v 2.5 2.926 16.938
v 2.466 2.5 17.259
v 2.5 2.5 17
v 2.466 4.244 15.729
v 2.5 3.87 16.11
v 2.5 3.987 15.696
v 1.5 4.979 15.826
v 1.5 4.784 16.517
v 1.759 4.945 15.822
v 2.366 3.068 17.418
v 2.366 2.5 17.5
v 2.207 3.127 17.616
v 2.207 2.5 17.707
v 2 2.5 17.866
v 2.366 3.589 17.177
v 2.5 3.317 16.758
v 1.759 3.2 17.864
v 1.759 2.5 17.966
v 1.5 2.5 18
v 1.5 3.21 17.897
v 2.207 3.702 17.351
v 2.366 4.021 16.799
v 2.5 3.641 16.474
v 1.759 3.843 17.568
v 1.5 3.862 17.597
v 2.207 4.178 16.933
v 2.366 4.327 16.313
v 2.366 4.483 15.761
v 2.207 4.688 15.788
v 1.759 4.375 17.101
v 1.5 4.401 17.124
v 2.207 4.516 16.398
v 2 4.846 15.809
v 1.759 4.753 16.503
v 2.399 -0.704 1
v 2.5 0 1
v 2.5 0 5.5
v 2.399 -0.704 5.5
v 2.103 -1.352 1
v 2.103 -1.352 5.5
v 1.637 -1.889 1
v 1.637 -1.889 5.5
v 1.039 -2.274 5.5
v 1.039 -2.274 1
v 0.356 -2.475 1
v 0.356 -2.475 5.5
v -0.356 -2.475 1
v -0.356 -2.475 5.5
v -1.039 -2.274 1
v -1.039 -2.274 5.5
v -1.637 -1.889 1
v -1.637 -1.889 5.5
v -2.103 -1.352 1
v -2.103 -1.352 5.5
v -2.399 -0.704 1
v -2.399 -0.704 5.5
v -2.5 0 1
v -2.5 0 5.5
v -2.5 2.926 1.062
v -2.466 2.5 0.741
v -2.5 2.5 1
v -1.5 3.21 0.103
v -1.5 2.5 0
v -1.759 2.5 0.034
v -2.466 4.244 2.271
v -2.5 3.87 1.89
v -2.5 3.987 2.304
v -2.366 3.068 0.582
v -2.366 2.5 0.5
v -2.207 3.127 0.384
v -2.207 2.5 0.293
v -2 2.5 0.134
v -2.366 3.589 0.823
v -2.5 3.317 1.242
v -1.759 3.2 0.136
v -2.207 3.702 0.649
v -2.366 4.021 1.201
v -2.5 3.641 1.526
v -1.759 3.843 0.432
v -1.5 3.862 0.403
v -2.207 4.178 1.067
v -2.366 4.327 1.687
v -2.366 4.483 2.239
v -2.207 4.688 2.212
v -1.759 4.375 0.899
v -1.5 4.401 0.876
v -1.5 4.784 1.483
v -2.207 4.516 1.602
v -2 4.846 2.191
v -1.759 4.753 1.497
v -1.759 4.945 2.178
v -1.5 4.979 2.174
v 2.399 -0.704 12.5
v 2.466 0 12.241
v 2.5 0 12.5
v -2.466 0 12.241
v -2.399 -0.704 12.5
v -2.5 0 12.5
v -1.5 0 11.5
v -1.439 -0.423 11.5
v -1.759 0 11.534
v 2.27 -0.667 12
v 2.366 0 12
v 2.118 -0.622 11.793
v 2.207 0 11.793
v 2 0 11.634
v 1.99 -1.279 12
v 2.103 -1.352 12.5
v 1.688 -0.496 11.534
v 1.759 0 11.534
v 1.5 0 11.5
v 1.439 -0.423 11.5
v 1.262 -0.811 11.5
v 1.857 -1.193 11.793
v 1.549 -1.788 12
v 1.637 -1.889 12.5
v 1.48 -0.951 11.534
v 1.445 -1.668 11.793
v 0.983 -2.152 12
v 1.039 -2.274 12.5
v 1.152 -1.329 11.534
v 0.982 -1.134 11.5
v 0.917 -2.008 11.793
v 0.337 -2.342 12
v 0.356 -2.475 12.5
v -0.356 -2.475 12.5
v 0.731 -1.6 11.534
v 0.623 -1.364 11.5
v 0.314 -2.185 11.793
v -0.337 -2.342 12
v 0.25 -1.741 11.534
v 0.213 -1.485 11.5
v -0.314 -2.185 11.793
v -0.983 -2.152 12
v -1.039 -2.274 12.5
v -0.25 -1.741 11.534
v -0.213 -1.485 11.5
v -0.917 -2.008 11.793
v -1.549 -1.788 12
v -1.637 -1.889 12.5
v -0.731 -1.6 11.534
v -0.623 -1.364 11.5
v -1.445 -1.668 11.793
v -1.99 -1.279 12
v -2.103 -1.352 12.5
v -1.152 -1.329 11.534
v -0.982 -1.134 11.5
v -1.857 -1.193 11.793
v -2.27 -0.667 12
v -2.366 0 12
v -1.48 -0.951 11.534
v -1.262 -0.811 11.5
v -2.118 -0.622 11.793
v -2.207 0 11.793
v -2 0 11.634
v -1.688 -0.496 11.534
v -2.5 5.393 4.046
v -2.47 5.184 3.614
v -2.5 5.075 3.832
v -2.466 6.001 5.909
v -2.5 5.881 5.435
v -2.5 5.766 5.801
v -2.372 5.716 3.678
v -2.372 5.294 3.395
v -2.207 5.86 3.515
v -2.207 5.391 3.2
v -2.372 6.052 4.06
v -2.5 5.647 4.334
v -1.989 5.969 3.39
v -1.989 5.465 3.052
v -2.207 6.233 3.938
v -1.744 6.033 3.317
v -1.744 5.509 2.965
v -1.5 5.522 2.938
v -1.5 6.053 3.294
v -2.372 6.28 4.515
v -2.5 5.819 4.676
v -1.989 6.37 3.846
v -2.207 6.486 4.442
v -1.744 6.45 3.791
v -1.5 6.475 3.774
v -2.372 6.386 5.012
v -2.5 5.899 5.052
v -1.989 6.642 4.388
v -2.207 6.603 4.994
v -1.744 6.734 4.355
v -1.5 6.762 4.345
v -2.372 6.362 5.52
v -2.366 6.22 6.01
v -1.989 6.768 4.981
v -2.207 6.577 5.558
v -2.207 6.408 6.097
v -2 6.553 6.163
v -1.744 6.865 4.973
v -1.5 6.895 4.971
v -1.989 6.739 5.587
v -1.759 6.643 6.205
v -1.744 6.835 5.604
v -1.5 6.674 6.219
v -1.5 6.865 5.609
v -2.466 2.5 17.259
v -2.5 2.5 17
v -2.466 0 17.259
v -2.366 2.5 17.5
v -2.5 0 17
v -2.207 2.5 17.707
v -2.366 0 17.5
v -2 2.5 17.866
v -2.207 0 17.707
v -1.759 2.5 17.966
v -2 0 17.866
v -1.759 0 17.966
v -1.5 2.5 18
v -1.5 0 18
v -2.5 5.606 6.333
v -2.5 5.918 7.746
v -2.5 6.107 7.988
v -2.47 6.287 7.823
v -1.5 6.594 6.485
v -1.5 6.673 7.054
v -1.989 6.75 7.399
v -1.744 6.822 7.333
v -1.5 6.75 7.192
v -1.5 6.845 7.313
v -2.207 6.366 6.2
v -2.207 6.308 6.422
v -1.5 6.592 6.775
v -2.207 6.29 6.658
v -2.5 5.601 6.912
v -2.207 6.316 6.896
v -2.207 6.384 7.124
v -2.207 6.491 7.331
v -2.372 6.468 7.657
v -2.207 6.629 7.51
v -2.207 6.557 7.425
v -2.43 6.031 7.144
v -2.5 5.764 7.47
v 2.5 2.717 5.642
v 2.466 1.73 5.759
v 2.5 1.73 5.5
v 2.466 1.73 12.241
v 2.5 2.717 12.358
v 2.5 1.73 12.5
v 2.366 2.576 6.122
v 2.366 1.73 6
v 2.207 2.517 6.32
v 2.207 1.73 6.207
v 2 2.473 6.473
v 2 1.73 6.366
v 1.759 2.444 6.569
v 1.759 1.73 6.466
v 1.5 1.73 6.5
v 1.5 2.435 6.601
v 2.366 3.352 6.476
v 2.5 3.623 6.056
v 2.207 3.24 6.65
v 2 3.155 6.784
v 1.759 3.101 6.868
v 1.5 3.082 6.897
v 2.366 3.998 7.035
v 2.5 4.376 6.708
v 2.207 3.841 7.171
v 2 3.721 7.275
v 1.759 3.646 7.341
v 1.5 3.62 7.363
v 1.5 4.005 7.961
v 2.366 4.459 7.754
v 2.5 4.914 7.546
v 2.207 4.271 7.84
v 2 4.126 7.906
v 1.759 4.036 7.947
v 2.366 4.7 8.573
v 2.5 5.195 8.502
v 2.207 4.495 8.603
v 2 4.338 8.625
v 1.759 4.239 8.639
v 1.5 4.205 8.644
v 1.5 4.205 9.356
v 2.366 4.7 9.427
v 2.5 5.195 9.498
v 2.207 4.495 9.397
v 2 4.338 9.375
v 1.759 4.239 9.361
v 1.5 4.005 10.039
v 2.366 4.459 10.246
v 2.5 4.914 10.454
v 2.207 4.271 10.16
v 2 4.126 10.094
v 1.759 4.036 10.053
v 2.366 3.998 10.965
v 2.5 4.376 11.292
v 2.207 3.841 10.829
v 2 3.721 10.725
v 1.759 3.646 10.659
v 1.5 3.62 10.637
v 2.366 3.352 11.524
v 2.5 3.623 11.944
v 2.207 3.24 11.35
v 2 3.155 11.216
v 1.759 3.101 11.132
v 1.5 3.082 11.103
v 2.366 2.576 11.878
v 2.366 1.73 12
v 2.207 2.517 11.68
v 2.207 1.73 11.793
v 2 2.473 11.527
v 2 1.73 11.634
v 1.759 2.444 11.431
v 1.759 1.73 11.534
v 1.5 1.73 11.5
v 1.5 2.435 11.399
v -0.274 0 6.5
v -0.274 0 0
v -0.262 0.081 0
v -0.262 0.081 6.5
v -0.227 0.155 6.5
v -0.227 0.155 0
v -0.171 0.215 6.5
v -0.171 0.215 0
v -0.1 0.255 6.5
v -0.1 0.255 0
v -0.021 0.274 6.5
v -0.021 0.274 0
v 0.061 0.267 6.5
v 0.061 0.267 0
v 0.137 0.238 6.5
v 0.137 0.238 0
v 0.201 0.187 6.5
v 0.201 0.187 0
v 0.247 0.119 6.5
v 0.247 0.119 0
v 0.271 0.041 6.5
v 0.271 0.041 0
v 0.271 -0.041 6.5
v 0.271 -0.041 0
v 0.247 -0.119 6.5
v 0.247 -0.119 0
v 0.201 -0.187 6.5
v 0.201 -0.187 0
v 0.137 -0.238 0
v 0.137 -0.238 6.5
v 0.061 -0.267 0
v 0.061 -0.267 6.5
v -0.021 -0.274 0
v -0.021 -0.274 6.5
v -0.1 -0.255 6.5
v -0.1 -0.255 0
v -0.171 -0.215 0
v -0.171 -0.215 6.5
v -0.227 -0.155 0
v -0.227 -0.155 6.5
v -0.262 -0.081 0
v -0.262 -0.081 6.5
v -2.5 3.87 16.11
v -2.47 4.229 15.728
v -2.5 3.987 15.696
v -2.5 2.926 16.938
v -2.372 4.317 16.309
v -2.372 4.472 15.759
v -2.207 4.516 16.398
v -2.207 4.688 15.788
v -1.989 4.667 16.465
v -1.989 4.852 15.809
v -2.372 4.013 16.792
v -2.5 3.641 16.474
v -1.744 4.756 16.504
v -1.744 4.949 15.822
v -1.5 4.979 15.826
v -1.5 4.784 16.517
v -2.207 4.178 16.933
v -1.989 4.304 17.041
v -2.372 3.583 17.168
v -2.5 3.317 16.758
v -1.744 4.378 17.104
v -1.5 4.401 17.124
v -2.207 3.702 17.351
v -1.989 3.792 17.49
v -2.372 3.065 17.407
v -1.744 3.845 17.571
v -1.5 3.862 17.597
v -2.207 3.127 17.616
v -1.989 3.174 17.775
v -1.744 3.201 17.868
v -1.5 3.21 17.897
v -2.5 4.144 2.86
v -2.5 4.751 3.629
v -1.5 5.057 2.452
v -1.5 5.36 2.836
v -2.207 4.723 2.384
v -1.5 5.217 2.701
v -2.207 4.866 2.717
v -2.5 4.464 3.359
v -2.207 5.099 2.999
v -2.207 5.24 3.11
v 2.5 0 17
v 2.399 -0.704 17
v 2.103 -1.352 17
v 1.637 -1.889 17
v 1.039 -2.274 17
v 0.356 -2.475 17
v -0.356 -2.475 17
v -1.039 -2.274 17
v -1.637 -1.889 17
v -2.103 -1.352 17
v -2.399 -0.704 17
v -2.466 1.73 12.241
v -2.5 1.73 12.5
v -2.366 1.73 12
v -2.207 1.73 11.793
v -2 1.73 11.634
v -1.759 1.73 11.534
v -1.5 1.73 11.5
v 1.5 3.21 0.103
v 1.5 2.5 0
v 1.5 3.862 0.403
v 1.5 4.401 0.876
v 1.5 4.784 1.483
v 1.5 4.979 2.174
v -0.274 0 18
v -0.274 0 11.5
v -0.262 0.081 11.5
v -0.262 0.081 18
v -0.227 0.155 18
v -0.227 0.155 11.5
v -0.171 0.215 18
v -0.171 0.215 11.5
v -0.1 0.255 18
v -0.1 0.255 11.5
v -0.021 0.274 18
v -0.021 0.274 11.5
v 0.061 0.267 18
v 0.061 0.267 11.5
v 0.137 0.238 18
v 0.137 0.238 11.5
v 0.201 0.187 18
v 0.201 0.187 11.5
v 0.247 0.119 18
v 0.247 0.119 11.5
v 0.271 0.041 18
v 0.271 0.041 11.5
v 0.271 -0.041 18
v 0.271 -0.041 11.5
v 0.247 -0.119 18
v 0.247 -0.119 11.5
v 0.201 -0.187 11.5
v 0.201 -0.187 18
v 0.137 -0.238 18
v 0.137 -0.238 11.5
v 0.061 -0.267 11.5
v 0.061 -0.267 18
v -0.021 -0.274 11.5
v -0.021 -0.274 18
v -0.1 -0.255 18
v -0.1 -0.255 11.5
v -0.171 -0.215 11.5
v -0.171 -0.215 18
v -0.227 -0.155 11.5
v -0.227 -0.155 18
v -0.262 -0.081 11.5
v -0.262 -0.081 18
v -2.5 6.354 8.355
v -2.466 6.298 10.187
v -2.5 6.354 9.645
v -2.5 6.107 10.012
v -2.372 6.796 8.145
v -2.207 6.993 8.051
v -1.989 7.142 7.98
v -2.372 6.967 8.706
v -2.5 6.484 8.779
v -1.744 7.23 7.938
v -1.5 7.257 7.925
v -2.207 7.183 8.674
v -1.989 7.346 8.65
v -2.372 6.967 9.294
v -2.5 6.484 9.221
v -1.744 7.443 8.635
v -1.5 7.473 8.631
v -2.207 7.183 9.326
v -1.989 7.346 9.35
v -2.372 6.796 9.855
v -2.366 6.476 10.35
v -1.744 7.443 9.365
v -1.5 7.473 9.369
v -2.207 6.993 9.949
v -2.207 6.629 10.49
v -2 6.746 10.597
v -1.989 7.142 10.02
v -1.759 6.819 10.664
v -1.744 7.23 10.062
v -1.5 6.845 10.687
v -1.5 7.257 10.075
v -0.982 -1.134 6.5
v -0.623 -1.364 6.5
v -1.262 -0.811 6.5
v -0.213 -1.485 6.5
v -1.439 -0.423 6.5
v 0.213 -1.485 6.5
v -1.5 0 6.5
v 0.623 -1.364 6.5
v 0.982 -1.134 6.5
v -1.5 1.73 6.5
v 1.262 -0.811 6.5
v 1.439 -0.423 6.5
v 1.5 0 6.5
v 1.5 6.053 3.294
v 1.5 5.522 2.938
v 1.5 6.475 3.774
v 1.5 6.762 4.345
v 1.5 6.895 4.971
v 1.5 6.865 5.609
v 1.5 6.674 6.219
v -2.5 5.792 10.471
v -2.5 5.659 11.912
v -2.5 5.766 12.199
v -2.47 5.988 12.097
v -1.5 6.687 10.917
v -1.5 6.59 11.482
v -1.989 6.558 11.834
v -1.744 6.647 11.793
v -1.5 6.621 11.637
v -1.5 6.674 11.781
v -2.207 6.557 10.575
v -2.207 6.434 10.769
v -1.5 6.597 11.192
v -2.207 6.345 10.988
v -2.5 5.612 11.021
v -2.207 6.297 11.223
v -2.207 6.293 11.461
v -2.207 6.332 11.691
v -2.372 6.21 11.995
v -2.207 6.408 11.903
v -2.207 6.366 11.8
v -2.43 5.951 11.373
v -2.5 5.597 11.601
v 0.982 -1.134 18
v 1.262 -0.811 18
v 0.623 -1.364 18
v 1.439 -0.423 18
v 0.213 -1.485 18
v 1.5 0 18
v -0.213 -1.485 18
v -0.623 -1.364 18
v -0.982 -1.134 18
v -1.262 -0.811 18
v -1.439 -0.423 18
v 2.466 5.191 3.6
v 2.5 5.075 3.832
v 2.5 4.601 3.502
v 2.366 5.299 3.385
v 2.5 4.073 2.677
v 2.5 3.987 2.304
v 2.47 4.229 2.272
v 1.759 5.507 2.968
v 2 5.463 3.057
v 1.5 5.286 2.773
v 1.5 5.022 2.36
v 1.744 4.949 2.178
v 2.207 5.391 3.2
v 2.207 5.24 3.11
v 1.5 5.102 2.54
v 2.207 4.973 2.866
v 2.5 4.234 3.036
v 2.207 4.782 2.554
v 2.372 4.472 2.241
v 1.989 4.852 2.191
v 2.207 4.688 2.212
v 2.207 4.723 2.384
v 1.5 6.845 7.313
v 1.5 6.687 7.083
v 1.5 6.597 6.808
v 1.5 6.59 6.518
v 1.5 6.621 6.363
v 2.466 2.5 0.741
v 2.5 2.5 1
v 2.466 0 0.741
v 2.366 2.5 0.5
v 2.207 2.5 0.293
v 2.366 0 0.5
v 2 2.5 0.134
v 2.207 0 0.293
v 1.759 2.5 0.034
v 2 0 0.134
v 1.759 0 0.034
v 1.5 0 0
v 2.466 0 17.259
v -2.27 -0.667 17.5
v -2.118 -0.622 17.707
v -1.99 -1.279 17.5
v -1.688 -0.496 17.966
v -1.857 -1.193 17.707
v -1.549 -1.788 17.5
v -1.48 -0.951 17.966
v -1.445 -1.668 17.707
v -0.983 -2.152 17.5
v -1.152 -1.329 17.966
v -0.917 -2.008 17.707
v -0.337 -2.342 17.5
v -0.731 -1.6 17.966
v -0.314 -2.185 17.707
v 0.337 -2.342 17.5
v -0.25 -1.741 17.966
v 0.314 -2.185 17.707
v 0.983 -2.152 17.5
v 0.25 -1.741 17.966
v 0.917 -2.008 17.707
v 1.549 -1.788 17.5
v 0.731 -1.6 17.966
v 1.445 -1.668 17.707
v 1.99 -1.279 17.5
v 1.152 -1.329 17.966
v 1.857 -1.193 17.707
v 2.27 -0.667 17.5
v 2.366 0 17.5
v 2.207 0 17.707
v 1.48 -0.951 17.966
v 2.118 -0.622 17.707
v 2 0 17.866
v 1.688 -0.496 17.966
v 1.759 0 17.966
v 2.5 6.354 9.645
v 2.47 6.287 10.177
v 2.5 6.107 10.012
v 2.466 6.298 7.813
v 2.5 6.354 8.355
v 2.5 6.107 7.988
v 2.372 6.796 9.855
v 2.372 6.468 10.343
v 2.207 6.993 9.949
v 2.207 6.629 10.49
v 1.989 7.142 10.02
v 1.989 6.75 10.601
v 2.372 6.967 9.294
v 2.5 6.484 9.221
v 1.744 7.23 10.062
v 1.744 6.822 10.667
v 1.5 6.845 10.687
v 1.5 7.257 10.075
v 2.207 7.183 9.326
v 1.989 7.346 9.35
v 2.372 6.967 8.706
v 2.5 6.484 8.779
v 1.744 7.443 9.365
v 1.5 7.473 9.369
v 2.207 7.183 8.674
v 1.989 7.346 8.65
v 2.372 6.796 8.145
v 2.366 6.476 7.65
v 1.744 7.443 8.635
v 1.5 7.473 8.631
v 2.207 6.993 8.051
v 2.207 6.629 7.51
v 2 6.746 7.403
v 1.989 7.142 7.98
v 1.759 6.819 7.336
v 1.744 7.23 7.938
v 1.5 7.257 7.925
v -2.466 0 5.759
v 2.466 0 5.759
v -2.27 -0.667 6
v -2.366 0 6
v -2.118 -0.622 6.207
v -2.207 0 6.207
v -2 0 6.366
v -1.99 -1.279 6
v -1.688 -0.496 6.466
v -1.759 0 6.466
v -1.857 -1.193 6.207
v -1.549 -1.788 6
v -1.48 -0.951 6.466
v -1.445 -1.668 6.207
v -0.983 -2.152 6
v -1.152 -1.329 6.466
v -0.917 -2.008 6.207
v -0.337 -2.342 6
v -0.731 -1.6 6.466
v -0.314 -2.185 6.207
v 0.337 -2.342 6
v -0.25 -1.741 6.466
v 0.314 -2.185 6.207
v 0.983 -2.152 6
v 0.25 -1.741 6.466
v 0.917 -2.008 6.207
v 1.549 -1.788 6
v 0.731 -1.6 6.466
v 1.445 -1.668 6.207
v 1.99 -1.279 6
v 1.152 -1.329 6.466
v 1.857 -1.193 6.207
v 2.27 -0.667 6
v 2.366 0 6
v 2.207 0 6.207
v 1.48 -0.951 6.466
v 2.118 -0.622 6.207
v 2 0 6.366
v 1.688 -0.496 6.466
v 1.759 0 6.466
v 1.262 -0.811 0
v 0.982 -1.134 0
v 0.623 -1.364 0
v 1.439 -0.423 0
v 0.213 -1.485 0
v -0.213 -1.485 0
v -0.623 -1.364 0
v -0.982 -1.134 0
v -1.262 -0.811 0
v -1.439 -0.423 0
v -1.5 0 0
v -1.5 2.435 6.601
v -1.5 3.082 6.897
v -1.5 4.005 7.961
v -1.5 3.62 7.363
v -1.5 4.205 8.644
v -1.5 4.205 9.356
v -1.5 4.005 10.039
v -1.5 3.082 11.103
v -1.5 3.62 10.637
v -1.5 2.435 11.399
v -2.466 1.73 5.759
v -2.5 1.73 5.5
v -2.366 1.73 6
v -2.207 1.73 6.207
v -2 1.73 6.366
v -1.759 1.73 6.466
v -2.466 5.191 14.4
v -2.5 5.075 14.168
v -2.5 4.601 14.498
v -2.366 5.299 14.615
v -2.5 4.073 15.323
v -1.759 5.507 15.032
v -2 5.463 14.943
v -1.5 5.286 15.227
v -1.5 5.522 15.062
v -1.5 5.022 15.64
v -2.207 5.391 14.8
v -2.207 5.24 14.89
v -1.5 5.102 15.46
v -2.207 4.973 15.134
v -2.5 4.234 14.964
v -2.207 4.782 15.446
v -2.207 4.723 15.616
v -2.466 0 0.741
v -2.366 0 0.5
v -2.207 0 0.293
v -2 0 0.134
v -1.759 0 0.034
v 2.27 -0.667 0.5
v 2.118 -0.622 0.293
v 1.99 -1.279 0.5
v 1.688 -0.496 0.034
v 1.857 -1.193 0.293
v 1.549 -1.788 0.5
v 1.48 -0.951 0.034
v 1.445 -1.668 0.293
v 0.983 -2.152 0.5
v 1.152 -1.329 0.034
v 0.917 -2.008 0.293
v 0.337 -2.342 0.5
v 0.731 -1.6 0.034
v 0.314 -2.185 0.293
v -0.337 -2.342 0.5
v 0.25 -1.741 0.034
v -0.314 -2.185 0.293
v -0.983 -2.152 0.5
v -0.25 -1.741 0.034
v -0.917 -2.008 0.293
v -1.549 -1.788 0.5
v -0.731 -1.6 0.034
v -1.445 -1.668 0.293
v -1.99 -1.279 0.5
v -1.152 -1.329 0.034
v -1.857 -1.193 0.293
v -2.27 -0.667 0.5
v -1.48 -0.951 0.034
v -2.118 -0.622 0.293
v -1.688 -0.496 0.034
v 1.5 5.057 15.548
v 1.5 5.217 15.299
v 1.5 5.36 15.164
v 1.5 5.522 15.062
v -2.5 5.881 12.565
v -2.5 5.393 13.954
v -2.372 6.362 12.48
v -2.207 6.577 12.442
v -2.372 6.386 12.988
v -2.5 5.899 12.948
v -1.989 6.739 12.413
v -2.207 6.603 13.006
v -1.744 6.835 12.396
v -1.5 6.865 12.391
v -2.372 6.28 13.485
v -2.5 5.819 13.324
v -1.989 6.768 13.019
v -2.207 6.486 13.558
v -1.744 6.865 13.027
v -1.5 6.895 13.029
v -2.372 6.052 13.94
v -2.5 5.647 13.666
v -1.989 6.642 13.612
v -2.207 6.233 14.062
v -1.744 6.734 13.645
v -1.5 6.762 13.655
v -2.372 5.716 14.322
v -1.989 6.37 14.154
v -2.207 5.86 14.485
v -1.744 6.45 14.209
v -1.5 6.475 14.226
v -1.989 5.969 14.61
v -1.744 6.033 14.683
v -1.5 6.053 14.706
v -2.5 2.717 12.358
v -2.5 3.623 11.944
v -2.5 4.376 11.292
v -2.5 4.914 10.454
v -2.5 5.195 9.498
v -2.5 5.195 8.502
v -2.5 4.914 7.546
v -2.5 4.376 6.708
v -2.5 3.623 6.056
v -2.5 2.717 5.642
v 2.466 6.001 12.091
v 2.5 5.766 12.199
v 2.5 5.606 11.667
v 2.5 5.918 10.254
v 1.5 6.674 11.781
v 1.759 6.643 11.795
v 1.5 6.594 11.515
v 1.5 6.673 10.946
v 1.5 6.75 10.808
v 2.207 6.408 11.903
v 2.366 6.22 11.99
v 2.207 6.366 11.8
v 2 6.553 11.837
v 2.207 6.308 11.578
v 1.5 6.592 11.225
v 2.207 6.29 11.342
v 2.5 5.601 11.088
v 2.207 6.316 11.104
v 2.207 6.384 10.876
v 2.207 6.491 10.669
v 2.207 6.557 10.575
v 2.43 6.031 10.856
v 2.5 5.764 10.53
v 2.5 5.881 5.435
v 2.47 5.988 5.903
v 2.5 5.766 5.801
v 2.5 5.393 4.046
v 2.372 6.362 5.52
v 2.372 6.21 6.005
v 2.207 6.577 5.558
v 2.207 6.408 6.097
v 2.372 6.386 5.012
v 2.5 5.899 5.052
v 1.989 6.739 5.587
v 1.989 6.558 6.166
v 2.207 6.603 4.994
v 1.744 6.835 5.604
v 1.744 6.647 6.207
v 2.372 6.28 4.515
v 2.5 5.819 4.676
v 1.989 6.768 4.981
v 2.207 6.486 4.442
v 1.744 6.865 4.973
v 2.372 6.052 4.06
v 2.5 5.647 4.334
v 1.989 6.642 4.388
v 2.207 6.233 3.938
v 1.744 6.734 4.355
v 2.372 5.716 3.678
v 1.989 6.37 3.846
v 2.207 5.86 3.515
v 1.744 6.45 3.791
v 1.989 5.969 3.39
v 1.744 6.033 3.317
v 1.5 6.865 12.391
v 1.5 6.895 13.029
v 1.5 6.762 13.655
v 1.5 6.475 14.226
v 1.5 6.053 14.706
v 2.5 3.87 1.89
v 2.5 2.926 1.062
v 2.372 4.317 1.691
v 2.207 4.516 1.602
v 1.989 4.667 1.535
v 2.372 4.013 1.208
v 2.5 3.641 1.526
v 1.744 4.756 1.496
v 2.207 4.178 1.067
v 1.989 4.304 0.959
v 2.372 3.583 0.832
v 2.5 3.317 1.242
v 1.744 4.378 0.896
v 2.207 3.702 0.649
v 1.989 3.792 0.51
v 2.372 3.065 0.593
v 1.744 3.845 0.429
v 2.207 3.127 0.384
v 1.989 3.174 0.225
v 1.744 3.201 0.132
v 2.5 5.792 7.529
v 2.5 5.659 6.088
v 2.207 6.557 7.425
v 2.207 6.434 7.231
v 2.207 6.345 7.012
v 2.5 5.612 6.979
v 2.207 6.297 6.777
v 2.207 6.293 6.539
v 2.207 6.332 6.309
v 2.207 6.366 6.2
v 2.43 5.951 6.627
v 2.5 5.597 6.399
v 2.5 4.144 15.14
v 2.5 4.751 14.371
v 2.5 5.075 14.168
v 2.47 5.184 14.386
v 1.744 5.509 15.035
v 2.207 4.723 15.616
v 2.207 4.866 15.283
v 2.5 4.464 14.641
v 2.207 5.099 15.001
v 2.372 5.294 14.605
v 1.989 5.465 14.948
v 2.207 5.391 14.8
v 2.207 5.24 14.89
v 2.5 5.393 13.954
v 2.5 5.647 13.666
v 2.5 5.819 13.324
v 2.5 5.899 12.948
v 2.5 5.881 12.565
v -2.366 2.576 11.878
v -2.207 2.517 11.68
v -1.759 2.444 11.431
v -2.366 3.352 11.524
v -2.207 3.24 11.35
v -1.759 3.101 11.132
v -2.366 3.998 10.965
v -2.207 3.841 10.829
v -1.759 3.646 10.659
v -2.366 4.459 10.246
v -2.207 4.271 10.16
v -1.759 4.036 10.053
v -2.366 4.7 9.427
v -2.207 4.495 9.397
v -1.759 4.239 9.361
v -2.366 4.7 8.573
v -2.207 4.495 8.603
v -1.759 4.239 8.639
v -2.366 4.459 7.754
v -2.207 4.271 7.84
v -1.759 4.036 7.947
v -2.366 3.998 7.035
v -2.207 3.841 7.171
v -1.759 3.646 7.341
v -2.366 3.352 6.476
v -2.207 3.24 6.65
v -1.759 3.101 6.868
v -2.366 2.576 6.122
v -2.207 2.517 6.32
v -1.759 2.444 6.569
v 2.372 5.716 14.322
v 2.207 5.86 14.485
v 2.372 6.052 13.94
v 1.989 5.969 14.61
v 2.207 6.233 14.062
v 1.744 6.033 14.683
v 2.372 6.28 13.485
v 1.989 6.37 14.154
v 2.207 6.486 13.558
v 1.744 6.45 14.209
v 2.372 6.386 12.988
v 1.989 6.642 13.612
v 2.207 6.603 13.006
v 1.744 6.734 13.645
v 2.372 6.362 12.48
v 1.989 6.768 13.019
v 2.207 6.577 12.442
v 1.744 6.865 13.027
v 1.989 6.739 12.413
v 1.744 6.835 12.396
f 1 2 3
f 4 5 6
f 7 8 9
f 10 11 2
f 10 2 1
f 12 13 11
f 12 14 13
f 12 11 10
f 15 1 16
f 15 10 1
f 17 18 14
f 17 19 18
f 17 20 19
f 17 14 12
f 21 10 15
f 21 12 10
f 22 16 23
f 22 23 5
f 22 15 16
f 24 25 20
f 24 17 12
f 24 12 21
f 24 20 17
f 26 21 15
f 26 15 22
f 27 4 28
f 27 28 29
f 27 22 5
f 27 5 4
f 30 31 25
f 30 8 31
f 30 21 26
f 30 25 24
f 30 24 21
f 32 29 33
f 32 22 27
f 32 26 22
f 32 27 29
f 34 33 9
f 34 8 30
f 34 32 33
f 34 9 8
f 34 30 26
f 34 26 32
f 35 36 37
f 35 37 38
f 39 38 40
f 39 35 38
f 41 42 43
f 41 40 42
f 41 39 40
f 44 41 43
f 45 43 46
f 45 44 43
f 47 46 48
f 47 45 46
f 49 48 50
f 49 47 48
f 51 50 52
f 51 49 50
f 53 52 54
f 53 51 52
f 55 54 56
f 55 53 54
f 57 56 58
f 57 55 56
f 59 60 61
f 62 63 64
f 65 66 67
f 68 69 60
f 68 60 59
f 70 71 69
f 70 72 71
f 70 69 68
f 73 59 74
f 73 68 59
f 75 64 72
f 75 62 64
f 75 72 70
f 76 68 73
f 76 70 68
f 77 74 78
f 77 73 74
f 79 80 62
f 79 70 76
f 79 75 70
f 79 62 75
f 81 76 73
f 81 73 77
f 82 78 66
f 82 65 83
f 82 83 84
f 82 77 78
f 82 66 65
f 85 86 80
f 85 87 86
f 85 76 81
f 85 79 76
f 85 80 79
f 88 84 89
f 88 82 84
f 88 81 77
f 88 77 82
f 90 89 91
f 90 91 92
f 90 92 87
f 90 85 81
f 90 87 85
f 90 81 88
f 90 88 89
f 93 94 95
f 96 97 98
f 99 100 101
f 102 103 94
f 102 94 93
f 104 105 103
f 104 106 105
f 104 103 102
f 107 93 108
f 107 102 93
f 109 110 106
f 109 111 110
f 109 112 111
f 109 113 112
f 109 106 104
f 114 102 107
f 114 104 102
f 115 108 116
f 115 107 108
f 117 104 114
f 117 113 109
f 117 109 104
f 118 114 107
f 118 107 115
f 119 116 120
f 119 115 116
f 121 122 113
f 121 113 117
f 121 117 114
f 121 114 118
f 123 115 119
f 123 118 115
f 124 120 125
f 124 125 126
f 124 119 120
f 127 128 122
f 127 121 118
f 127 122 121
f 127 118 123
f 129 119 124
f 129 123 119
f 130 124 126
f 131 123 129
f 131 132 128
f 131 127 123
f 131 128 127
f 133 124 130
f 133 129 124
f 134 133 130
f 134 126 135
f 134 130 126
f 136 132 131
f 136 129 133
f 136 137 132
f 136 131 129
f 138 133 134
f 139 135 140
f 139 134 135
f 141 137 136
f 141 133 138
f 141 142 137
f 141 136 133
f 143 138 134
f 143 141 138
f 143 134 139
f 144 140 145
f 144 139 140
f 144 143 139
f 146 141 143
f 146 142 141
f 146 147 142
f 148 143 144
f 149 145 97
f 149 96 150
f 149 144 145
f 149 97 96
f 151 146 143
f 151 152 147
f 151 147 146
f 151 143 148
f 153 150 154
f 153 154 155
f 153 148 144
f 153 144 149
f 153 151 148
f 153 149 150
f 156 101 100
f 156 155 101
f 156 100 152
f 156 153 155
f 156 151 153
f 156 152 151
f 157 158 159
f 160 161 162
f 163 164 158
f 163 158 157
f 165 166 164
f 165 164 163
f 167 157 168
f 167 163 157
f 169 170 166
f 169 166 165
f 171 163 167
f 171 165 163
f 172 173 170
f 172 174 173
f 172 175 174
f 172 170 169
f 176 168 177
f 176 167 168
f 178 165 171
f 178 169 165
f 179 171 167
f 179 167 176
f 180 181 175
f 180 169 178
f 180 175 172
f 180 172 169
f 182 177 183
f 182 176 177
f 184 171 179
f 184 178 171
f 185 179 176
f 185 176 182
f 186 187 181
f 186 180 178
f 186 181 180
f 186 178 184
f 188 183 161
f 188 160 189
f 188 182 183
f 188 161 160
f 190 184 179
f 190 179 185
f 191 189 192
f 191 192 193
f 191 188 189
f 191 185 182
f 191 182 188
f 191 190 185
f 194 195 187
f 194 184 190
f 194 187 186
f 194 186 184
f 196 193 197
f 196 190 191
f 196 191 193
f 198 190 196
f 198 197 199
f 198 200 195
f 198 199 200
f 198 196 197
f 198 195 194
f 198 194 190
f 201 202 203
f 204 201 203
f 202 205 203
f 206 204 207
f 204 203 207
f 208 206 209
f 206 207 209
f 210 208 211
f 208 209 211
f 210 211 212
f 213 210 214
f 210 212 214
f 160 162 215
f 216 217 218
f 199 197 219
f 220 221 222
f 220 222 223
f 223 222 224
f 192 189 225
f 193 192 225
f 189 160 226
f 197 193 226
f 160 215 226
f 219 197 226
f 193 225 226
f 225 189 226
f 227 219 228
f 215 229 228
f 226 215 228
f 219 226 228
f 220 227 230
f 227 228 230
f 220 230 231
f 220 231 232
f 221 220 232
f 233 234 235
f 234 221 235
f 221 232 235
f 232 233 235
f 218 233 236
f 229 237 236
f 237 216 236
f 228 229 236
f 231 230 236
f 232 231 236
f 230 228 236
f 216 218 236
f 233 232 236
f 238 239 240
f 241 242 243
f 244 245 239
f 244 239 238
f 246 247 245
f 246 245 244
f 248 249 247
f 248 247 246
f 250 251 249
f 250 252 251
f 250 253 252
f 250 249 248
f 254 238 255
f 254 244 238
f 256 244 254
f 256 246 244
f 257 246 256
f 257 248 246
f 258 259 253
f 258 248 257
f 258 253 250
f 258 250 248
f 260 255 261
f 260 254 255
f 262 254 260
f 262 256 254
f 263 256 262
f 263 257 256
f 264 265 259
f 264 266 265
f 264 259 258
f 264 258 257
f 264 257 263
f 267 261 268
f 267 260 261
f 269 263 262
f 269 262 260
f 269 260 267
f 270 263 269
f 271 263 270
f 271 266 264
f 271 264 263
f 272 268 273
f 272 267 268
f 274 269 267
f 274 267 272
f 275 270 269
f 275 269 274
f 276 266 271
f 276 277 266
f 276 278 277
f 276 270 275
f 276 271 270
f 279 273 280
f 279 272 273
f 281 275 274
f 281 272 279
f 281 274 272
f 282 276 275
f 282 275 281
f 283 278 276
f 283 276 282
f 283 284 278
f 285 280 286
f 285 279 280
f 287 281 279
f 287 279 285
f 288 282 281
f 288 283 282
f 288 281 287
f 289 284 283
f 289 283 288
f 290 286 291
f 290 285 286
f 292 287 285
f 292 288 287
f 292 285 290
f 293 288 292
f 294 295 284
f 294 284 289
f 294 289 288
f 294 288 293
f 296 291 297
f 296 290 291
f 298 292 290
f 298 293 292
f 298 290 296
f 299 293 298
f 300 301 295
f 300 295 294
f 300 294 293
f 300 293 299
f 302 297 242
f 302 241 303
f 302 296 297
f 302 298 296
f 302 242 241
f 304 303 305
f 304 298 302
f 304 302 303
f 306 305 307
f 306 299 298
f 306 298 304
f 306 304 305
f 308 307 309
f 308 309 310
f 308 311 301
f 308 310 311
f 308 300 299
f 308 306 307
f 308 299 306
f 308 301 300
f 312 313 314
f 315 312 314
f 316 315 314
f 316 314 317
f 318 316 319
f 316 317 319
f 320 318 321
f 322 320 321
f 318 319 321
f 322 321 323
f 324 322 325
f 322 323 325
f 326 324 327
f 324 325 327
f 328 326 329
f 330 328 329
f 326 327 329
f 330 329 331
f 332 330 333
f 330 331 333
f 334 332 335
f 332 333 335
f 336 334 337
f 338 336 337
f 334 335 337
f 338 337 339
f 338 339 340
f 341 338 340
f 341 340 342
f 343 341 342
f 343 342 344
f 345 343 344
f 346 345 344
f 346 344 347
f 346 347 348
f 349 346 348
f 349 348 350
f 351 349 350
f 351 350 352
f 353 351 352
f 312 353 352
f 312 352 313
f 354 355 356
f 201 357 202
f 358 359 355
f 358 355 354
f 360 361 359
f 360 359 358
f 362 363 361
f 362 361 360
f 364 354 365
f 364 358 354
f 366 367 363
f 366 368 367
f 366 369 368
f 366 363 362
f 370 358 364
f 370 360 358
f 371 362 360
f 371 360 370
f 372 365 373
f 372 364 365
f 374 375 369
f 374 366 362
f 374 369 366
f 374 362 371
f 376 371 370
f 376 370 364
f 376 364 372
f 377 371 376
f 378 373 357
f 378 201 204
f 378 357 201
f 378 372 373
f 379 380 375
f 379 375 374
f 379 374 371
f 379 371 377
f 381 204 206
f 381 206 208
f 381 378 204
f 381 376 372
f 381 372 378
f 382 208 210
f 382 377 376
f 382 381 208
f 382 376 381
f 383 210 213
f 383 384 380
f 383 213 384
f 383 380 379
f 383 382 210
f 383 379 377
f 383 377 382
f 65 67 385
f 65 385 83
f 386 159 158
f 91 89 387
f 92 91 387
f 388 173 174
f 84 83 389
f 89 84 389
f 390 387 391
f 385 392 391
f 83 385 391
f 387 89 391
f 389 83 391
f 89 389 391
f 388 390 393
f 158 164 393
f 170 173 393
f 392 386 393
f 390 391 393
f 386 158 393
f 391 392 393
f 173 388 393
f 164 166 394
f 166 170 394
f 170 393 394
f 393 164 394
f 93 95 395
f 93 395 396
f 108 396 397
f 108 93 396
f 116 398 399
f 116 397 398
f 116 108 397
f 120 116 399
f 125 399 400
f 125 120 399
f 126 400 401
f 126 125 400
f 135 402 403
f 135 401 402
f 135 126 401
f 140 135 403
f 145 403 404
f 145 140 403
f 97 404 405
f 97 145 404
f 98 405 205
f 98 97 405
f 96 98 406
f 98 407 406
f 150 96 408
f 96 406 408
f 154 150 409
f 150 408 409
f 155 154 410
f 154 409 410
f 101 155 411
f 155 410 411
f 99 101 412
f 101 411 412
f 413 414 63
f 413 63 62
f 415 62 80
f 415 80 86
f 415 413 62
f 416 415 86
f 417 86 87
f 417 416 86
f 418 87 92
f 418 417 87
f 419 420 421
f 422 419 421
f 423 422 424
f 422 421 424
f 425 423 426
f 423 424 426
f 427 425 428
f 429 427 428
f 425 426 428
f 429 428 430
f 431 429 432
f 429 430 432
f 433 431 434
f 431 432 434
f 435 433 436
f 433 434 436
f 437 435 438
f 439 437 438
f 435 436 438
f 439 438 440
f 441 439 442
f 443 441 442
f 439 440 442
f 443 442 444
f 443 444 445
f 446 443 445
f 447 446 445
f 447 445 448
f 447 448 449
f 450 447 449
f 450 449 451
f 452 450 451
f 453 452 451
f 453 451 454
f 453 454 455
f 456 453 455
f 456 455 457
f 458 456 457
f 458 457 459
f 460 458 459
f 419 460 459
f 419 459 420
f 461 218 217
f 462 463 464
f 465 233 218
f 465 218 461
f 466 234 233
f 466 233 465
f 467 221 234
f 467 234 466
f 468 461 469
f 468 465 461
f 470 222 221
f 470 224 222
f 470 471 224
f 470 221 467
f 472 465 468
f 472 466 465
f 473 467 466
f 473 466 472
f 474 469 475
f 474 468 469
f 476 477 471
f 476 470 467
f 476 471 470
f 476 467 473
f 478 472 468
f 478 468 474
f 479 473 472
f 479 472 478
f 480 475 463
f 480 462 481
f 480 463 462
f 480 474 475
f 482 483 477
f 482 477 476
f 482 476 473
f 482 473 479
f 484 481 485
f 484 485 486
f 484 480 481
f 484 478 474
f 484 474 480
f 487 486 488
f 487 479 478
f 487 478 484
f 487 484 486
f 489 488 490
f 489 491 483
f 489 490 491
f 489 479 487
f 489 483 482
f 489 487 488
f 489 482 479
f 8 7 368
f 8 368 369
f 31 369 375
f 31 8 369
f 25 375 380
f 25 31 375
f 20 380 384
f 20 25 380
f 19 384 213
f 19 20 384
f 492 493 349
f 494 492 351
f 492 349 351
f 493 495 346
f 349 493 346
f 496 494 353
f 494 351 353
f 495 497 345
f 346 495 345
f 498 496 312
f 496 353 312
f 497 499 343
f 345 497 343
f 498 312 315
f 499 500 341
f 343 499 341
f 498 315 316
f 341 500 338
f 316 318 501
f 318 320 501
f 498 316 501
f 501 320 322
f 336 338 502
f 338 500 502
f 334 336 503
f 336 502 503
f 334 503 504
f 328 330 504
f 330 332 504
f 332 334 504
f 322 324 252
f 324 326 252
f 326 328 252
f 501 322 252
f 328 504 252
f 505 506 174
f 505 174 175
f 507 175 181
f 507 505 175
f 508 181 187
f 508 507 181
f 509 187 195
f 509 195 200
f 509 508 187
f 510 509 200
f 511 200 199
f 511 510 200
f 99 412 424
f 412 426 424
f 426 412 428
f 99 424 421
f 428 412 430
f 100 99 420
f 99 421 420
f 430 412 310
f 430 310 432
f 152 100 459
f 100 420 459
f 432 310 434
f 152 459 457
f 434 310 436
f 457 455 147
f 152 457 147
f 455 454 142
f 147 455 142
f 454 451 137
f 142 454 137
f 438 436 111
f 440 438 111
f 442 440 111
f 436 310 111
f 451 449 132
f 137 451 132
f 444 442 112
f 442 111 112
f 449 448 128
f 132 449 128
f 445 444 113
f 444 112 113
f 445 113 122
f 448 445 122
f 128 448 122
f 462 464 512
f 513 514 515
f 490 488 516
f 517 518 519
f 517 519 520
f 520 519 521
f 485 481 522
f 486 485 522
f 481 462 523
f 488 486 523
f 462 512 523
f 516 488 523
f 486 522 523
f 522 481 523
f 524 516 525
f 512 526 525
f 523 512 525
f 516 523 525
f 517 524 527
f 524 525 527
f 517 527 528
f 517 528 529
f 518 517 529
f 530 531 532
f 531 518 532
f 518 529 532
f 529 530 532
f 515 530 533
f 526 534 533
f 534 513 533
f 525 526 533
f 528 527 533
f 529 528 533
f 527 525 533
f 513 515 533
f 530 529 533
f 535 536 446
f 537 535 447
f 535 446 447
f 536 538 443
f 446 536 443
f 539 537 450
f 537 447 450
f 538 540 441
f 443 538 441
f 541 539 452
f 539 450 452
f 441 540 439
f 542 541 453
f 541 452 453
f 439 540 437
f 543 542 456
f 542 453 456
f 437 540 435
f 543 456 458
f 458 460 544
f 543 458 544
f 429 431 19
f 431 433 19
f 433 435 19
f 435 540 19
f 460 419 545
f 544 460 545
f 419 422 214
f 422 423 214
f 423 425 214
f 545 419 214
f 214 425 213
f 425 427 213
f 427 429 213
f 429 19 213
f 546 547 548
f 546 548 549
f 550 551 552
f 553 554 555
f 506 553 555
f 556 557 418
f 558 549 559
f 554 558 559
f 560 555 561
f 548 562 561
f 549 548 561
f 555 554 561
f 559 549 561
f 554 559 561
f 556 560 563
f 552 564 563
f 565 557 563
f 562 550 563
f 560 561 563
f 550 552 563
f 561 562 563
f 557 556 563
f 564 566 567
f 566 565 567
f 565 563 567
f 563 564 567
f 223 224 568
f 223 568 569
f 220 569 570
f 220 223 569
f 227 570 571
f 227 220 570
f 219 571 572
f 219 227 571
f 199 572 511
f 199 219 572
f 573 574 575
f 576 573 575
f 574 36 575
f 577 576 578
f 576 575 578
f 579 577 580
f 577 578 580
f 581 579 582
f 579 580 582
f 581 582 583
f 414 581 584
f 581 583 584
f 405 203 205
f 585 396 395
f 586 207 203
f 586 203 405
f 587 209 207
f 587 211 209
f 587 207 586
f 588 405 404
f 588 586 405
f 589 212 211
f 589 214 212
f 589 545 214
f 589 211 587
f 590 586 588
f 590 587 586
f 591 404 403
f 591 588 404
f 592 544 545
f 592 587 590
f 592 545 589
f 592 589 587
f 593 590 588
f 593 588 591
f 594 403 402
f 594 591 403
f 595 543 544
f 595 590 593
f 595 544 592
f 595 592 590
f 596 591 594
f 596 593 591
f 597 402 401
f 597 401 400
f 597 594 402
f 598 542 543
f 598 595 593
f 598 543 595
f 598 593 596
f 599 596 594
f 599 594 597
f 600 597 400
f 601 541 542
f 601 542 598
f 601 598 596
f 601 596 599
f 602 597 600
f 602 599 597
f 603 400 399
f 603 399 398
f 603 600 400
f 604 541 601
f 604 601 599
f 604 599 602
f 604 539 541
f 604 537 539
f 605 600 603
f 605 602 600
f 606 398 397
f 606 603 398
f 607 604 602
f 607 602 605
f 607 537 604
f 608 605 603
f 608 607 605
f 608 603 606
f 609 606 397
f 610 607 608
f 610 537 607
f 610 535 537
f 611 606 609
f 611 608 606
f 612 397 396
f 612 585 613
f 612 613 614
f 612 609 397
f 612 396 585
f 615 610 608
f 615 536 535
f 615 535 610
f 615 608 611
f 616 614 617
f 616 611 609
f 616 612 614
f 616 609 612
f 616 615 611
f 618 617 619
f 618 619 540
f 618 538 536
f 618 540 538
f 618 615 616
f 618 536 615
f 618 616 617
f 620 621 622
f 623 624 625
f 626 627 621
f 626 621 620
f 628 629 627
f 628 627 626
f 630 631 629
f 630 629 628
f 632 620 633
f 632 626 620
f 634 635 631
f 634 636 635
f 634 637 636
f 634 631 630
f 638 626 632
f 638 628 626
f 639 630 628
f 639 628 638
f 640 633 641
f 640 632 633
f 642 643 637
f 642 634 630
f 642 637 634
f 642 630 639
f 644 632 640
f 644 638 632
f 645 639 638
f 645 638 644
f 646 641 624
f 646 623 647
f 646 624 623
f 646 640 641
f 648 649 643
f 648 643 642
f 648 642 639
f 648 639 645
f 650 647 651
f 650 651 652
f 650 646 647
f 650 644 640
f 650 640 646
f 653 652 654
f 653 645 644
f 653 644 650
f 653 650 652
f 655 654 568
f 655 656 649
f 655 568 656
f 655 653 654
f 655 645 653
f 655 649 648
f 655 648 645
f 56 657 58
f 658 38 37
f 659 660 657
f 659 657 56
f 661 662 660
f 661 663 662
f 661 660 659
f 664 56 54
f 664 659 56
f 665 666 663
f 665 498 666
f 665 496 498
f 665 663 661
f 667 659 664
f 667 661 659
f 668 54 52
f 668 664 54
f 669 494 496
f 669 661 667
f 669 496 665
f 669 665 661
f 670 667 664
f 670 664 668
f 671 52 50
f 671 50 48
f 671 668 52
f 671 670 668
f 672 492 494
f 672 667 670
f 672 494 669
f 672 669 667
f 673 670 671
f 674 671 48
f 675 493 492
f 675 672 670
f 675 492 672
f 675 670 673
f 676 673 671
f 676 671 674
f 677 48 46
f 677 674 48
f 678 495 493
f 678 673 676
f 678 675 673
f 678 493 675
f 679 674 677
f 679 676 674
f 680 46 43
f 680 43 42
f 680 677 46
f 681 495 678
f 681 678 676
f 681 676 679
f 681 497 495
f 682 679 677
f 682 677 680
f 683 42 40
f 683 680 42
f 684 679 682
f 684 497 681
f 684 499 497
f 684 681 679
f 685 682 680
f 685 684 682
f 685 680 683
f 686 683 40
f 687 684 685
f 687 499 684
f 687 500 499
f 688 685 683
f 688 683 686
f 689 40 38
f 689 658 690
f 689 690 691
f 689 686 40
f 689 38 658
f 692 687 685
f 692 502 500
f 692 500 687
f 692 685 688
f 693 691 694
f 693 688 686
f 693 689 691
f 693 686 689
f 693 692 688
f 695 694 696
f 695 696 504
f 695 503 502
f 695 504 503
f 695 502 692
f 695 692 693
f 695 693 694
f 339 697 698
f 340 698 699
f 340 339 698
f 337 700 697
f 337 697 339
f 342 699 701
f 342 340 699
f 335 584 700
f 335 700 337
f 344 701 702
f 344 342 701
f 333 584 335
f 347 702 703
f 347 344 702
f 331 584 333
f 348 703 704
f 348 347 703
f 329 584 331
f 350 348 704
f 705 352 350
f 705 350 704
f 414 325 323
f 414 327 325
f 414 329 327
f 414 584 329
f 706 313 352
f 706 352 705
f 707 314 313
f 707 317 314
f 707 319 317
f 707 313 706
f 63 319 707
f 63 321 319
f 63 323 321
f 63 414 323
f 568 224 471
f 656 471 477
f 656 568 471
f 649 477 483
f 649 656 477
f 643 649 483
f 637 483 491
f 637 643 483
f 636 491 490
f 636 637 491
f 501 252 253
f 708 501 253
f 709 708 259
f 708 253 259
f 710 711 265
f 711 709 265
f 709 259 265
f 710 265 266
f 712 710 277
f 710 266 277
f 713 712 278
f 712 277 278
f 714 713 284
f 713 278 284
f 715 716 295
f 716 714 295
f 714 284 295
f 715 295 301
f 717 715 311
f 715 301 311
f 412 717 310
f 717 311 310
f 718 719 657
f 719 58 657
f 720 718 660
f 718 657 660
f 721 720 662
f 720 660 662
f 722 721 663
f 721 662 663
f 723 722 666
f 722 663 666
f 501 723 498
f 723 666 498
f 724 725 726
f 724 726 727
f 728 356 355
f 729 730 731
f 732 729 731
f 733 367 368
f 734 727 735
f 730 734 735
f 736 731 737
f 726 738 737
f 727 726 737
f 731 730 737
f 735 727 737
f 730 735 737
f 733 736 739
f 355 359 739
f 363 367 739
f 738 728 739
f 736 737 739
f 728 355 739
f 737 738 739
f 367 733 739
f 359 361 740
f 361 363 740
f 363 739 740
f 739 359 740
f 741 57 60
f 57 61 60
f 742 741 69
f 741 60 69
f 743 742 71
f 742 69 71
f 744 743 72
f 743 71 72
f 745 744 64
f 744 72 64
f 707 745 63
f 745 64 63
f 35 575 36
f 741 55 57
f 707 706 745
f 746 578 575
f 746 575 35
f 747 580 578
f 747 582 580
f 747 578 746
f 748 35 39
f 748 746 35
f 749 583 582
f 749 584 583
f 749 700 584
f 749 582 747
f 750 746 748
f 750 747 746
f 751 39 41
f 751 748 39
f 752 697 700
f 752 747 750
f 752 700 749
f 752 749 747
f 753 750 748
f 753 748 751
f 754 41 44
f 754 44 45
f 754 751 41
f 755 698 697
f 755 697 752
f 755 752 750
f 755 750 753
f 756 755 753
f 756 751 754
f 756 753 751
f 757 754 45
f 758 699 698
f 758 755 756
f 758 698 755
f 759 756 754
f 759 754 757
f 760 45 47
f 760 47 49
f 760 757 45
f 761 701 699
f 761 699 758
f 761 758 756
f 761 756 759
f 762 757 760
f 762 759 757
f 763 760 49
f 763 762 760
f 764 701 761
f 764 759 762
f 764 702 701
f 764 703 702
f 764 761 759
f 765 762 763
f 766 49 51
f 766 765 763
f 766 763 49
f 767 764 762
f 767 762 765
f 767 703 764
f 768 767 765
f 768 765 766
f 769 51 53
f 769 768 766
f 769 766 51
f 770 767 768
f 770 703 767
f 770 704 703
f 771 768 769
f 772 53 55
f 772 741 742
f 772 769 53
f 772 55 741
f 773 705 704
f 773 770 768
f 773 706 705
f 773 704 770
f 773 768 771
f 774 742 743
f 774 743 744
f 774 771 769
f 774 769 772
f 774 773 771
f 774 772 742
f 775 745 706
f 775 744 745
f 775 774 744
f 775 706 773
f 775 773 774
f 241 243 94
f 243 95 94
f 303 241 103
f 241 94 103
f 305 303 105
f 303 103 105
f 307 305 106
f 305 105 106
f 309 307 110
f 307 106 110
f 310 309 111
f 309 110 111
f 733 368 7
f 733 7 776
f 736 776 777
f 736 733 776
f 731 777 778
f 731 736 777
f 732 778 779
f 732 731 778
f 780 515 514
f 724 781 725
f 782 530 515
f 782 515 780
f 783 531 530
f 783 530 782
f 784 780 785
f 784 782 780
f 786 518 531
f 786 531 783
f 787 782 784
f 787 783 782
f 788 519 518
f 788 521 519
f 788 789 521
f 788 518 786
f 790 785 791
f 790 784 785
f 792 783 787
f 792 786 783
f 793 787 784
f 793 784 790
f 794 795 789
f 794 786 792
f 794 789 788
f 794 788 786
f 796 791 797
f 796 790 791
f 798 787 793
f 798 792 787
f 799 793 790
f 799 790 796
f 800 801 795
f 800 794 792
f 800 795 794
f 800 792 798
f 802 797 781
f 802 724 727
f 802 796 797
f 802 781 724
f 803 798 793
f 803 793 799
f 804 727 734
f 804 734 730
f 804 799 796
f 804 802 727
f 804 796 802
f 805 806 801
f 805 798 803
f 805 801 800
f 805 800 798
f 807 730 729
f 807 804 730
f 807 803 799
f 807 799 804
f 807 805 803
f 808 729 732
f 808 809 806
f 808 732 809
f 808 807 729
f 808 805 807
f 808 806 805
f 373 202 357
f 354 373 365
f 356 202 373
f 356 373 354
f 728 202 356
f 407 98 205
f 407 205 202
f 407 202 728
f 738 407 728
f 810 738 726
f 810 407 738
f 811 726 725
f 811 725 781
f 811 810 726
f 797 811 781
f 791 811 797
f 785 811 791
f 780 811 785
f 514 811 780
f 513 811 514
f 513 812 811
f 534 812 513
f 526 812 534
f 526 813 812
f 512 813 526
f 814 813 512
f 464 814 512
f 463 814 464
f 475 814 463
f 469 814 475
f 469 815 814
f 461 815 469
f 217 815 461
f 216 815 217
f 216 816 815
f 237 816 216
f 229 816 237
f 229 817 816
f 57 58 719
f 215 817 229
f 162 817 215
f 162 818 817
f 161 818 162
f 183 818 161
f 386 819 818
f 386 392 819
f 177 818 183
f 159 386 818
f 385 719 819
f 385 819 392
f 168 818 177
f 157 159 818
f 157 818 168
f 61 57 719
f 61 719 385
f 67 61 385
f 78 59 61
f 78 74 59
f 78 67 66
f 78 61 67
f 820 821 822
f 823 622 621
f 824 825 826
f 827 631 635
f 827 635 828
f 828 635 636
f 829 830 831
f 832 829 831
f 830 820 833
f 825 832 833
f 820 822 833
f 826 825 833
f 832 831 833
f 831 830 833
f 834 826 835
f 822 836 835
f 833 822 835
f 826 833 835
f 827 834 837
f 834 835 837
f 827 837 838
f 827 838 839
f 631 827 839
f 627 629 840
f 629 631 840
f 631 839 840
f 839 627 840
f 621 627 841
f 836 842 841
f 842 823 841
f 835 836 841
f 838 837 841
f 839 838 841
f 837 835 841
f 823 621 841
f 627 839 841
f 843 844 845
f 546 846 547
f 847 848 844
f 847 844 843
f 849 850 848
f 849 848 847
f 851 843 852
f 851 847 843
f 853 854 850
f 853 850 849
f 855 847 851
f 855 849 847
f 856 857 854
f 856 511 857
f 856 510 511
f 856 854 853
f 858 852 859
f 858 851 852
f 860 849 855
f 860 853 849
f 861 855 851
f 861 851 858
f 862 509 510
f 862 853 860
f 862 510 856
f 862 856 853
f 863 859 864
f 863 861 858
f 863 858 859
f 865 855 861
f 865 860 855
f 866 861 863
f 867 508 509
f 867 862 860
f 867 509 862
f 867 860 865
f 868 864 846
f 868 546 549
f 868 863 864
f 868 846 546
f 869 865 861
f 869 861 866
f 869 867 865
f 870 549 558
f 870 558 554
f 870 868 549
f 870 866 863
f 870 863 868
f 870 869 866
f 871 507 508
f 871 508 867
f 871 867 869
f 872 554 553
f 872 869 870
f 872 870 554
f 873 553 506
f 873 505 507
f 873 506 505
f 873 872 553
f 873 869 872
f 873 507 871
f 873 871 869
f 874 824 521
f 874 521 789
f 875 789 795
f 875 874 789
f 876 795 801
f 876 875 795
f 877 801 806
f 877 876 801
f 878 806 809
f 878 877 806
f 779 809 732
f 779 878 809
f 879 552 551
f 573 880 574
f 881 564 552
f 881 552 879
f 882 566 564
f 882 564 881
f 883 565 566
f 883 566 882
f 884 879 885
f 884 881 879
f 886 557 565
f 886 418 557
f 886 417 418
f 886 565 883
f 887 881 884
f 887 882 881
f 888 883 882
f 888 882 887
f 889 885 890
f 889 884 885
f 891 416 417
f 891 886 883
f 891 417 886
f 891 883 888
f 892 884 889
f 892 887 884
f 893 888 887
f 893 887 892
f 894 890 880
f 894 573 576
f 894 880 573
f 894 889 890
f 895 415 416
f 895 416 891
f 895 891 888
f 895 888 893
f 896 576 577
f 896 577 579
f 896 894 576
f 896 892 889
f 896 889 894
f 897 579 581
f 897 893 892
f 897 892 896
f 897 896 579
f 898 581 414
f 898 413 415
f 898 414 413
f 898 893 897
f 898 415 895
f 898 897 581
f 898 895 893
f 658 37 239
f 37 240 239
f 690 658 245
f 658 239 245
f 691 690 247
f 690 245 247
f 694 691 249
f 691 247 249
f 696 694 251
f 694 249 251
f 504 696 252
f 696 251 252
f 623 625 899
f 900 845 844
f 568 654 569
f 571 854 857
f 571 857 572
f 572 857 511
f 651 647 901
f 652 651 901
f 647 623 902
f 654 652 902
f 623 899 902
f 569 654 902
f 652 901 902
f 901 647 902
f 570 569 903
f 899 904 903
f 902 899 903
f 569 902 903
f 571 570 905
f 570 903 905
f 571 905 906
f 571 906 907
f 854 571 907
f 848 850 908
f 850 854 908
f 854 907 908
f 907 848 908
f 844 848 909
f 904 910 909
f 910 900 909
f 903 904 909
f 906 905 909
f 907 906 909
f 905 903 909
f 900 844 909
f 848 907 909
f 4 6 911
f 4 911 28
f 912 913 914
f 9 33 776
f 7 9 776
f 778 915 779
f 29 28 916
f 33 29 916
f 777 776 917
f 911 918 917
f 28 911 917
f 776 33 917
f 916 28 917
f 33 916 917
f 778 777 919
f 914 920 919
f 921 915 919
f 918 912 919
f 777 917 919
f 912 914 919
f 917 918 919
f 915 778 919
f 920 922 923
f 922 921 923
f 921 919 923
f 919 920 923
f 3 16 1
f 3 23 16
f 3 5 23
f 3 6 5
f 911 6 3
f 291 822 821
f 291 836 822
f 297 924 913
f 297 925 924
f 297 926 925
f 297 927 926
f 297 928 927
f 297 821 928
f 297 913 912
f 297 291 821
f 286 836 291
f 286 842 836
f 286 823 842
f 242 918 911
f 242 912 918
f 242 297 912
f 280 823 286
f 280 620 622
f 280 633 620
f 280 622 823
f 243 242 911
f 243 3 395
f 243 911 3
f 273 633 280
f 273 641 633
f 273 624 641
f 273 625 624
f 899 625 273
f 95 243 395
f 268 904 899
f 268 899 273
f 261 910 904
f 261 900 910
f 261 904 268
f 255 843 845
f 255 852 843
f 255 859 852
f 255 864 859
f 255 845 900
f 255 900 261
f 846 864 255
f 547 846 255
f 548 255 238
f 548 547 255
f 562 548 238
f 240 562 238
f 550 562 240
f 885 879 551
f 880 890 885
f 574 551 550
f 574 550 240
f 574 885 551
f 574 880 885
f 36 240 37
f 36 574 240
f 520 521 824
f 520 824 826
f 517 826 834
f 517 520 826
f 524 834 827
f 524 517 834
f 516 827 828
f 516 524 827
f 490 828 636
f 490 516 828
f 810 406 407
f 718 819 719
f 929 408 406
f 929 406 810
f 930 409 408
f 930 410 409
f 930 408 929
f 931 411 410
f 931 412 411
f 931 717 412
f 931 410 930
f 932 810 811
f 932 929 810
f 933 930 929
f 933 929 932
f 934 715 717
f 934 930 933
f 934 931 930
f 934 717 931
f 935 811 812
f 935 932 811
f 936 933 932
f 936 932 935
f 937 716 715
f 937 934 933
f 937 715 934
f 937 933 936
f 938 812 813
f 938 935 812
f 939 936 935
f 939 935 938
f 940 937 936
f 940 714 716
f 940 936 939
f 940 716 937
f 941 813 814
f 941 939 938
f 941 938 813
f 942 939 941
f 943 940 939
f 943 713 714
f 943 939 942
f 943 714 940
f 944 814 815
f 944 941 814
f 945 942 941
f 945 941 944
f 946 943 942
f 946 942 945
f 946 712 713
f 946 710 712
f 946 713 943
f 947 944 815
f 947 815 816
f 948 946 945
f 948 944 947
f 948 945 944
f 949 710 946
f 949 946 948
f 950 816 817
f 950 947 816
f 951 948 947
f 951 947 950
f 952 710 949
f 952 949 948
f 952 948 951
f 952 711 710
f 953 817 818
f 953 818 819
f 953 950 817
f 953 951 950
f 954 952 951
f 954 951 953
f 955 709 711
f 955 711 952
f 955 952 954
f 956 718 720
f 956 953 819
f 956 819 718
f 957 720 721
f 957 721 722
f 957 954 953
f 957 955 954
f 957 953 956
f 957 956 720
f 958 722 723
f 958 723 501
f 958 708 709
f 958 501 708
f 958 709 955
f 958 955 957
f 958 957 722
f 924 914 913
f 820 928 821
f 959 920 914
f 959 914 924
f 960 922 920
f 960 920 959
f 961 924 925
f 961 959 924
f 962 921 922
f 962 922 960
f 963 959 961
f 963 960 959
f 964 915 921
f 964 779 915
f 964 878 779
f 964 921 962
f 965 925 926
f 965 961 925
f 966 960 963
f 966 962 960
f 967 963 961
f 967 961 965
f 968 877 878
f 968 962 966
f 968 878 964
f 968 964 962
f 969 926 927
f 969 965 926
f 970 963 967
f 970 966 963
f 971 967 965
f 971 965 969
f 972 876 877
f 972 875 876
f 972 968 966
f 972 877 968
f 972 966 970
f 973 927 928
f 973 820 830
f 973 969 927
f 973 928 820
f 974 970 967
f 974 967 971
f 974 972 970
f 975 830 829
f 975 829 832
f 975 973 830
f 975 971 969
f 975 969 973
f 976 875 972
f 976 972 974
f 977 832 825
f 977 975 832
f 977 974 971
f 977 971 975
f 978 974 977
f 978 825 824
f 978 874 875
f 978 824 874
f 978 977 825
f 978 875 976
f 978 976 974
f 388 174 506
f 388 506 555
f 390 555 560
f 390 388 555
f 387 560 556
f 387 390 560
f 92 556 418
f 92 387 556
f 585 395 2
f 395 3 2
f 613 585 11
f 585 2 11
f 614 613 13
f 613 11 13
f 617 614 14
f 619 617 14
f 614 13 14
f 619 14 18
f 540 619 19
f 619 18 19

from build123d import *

# Parameters (mm, degrees)
EXTRUDE_1_DEPTH     = 18
CUT_EXTRUDE_1_DEPTH = 6
SKETCH_3_R          = 0.274367176
CUT_EXTRUDE_2_DEPTH = 19
FILLET_1_R          = 1
FILLET_2_R          = 1


with BuildPart() as part:
    # Эскиз1 → Бобышка-Вытянуть1 (new body)
    with BuildSketch(Plane.XY):
        with BuildLine():
            Line((-2.5, 0), (-2.5, 7.5))
            Line((-2.5, 7.5), (2.5, 7.5))
            Line((2.5, 7.5), (2.5, 0))
            ThreePointArc((2.5, 0), (0, -2.5), (-2.5, 0))
        make_face()
    extrude(amount=EXTRUDE_1_DEPTH)

    # Эскиз2 → Вырез-Вытянуть1 (cut, through all)
    with BuildSketch(Plane(origin=(2.5, 0, 0), x_dir=(0, 0, -1), z_dir=(1, 0, 0))):
        with BuildLine():
            Line((-18, 2.5), (-18, 8.150544397))
            Line((-18, 8.150544397), (0, 8.150544397))
            Line((0, 8.150544397), (0, 2.5))
            ThreePointArc((0, 2.5), (-0.820177727, 4.351539125), (-2.742557705, 4.988205329))
            ThreePointArc((-2.742557705, 4.988205329), (-4.430502259, 6.790648336), (-6.843102403, 6.264038273))
            ThreePointArc((-6.843102403, 6.264038273), (-9, 7.5), (-11.156897597, 6.264038273))
            ThreePointArc((-11.156897597, 6.264038273), (-13.569497741, 6.790648336), (-15.257442295, 4.988205329))
            ThreePointArc((-15.257442295, 4.988205329), (-17.179822273, 4.351539125), (-18, 2.5))
        make_face()
        with BuildLine():
            Line((-11.5, 1.730499203), (-11.5, -3.555972199))
            Line((-11.5, -3.555972199), (-6.5, -3.555972199))
            Line((-6.5, -3.555972199), (-6.5, 1.730499203))
            ThreePointArc((-6.5, 1.730499203), (-9, 4.230499203), (-11.5, 1.730499203))
        make_face()
    extrude(amount=-CUT_EXTRUDE_1_DEPTH, mode=Mode.SUBTRACT)

    # Эскиз3 → Вырез-Вытянуть2 (cut, through all)
    with BuildSketch(Plane(origin=(0, 0, 0), x_dir=(-1, 0, 0), z_dir=(0, 0, -1))):
        Circle(SKETCH_3_R)
    extrude(amount=-CUT_EXTRUDE_2_DEPTH, mode=Mode.SUBTRACT)

    # Скругление1
    fillet_1_edges = [part.edges().sort_by_distance(p)[0] for p in [
        (0, 6.264038273, 6.843102403),
        (0, 6.264038273, 11.156897597),
        (0, 4.988205329, 15.257442295),
        (0, 4.988205329, 2.742557705),
    ]]
    fillet(fillet_1_edges, radius=FILLET_1_R)

    # Скругление2
    fillet_2_edges = [part.edges().sort_by_distance(p)[0] for p in [
        (-2.5, 1.25, 0),
        (-2.5, 1.25, 18),
        (2.5, 4.148426978, 17.379544758),
        (-2.5, 4.148426978, 17.379544758),
        (0, -2.5, 18),
        (-2.5, 0.865249601, 6.5),
        (2.5, 0.865249601, 11.5),
        (2.5, 0.865249601, 6.5),
        (2.5, 4.230499203, 9),
        (0, -2.5, 6.5),
        (-2.5, 0.865249601, 11.5),
        (0, -2.5, 11.5),
        (-2.5, 4.230499203, 9),
        (2.5, 1.25, 0),
        (0, -2.5, 0),
        (2.5, 1.25, 18),
        (2.5, 4.148426978, 0.620455242),
        (-2.5, 4.148426978, 0.620455242),
        (2.5, 6.762465879, 4.345340523),
        (-2.5, 6.762465879, 4.345340523),
        (2.5, 7.5, 9),
        (-2.5, 7.5, 9),
        (2.5, 6.762465879, 13.654659477),
        (-2.5, 6.762465879, 13.654659477),
        (2.5, 5.155501136, 2.623431365),
        (-2.5, 5.155501136, 2.623431365),
        (2.5, 6.594385937, 6.791611414),
        (-2.5, 6.594385937, 6.791611414),
        (2.5, 6.594385937, 11.208388586),
        (-2.5, 6.594385937, 11.208388586),
        (2.5, 5.155501136, 15.376568635),
        (-2.5, 5.155501136, 15.376568635),
    ]]
    fillet(fillet_2_edges, radius=FILLET_2_R)


solid = part.part
